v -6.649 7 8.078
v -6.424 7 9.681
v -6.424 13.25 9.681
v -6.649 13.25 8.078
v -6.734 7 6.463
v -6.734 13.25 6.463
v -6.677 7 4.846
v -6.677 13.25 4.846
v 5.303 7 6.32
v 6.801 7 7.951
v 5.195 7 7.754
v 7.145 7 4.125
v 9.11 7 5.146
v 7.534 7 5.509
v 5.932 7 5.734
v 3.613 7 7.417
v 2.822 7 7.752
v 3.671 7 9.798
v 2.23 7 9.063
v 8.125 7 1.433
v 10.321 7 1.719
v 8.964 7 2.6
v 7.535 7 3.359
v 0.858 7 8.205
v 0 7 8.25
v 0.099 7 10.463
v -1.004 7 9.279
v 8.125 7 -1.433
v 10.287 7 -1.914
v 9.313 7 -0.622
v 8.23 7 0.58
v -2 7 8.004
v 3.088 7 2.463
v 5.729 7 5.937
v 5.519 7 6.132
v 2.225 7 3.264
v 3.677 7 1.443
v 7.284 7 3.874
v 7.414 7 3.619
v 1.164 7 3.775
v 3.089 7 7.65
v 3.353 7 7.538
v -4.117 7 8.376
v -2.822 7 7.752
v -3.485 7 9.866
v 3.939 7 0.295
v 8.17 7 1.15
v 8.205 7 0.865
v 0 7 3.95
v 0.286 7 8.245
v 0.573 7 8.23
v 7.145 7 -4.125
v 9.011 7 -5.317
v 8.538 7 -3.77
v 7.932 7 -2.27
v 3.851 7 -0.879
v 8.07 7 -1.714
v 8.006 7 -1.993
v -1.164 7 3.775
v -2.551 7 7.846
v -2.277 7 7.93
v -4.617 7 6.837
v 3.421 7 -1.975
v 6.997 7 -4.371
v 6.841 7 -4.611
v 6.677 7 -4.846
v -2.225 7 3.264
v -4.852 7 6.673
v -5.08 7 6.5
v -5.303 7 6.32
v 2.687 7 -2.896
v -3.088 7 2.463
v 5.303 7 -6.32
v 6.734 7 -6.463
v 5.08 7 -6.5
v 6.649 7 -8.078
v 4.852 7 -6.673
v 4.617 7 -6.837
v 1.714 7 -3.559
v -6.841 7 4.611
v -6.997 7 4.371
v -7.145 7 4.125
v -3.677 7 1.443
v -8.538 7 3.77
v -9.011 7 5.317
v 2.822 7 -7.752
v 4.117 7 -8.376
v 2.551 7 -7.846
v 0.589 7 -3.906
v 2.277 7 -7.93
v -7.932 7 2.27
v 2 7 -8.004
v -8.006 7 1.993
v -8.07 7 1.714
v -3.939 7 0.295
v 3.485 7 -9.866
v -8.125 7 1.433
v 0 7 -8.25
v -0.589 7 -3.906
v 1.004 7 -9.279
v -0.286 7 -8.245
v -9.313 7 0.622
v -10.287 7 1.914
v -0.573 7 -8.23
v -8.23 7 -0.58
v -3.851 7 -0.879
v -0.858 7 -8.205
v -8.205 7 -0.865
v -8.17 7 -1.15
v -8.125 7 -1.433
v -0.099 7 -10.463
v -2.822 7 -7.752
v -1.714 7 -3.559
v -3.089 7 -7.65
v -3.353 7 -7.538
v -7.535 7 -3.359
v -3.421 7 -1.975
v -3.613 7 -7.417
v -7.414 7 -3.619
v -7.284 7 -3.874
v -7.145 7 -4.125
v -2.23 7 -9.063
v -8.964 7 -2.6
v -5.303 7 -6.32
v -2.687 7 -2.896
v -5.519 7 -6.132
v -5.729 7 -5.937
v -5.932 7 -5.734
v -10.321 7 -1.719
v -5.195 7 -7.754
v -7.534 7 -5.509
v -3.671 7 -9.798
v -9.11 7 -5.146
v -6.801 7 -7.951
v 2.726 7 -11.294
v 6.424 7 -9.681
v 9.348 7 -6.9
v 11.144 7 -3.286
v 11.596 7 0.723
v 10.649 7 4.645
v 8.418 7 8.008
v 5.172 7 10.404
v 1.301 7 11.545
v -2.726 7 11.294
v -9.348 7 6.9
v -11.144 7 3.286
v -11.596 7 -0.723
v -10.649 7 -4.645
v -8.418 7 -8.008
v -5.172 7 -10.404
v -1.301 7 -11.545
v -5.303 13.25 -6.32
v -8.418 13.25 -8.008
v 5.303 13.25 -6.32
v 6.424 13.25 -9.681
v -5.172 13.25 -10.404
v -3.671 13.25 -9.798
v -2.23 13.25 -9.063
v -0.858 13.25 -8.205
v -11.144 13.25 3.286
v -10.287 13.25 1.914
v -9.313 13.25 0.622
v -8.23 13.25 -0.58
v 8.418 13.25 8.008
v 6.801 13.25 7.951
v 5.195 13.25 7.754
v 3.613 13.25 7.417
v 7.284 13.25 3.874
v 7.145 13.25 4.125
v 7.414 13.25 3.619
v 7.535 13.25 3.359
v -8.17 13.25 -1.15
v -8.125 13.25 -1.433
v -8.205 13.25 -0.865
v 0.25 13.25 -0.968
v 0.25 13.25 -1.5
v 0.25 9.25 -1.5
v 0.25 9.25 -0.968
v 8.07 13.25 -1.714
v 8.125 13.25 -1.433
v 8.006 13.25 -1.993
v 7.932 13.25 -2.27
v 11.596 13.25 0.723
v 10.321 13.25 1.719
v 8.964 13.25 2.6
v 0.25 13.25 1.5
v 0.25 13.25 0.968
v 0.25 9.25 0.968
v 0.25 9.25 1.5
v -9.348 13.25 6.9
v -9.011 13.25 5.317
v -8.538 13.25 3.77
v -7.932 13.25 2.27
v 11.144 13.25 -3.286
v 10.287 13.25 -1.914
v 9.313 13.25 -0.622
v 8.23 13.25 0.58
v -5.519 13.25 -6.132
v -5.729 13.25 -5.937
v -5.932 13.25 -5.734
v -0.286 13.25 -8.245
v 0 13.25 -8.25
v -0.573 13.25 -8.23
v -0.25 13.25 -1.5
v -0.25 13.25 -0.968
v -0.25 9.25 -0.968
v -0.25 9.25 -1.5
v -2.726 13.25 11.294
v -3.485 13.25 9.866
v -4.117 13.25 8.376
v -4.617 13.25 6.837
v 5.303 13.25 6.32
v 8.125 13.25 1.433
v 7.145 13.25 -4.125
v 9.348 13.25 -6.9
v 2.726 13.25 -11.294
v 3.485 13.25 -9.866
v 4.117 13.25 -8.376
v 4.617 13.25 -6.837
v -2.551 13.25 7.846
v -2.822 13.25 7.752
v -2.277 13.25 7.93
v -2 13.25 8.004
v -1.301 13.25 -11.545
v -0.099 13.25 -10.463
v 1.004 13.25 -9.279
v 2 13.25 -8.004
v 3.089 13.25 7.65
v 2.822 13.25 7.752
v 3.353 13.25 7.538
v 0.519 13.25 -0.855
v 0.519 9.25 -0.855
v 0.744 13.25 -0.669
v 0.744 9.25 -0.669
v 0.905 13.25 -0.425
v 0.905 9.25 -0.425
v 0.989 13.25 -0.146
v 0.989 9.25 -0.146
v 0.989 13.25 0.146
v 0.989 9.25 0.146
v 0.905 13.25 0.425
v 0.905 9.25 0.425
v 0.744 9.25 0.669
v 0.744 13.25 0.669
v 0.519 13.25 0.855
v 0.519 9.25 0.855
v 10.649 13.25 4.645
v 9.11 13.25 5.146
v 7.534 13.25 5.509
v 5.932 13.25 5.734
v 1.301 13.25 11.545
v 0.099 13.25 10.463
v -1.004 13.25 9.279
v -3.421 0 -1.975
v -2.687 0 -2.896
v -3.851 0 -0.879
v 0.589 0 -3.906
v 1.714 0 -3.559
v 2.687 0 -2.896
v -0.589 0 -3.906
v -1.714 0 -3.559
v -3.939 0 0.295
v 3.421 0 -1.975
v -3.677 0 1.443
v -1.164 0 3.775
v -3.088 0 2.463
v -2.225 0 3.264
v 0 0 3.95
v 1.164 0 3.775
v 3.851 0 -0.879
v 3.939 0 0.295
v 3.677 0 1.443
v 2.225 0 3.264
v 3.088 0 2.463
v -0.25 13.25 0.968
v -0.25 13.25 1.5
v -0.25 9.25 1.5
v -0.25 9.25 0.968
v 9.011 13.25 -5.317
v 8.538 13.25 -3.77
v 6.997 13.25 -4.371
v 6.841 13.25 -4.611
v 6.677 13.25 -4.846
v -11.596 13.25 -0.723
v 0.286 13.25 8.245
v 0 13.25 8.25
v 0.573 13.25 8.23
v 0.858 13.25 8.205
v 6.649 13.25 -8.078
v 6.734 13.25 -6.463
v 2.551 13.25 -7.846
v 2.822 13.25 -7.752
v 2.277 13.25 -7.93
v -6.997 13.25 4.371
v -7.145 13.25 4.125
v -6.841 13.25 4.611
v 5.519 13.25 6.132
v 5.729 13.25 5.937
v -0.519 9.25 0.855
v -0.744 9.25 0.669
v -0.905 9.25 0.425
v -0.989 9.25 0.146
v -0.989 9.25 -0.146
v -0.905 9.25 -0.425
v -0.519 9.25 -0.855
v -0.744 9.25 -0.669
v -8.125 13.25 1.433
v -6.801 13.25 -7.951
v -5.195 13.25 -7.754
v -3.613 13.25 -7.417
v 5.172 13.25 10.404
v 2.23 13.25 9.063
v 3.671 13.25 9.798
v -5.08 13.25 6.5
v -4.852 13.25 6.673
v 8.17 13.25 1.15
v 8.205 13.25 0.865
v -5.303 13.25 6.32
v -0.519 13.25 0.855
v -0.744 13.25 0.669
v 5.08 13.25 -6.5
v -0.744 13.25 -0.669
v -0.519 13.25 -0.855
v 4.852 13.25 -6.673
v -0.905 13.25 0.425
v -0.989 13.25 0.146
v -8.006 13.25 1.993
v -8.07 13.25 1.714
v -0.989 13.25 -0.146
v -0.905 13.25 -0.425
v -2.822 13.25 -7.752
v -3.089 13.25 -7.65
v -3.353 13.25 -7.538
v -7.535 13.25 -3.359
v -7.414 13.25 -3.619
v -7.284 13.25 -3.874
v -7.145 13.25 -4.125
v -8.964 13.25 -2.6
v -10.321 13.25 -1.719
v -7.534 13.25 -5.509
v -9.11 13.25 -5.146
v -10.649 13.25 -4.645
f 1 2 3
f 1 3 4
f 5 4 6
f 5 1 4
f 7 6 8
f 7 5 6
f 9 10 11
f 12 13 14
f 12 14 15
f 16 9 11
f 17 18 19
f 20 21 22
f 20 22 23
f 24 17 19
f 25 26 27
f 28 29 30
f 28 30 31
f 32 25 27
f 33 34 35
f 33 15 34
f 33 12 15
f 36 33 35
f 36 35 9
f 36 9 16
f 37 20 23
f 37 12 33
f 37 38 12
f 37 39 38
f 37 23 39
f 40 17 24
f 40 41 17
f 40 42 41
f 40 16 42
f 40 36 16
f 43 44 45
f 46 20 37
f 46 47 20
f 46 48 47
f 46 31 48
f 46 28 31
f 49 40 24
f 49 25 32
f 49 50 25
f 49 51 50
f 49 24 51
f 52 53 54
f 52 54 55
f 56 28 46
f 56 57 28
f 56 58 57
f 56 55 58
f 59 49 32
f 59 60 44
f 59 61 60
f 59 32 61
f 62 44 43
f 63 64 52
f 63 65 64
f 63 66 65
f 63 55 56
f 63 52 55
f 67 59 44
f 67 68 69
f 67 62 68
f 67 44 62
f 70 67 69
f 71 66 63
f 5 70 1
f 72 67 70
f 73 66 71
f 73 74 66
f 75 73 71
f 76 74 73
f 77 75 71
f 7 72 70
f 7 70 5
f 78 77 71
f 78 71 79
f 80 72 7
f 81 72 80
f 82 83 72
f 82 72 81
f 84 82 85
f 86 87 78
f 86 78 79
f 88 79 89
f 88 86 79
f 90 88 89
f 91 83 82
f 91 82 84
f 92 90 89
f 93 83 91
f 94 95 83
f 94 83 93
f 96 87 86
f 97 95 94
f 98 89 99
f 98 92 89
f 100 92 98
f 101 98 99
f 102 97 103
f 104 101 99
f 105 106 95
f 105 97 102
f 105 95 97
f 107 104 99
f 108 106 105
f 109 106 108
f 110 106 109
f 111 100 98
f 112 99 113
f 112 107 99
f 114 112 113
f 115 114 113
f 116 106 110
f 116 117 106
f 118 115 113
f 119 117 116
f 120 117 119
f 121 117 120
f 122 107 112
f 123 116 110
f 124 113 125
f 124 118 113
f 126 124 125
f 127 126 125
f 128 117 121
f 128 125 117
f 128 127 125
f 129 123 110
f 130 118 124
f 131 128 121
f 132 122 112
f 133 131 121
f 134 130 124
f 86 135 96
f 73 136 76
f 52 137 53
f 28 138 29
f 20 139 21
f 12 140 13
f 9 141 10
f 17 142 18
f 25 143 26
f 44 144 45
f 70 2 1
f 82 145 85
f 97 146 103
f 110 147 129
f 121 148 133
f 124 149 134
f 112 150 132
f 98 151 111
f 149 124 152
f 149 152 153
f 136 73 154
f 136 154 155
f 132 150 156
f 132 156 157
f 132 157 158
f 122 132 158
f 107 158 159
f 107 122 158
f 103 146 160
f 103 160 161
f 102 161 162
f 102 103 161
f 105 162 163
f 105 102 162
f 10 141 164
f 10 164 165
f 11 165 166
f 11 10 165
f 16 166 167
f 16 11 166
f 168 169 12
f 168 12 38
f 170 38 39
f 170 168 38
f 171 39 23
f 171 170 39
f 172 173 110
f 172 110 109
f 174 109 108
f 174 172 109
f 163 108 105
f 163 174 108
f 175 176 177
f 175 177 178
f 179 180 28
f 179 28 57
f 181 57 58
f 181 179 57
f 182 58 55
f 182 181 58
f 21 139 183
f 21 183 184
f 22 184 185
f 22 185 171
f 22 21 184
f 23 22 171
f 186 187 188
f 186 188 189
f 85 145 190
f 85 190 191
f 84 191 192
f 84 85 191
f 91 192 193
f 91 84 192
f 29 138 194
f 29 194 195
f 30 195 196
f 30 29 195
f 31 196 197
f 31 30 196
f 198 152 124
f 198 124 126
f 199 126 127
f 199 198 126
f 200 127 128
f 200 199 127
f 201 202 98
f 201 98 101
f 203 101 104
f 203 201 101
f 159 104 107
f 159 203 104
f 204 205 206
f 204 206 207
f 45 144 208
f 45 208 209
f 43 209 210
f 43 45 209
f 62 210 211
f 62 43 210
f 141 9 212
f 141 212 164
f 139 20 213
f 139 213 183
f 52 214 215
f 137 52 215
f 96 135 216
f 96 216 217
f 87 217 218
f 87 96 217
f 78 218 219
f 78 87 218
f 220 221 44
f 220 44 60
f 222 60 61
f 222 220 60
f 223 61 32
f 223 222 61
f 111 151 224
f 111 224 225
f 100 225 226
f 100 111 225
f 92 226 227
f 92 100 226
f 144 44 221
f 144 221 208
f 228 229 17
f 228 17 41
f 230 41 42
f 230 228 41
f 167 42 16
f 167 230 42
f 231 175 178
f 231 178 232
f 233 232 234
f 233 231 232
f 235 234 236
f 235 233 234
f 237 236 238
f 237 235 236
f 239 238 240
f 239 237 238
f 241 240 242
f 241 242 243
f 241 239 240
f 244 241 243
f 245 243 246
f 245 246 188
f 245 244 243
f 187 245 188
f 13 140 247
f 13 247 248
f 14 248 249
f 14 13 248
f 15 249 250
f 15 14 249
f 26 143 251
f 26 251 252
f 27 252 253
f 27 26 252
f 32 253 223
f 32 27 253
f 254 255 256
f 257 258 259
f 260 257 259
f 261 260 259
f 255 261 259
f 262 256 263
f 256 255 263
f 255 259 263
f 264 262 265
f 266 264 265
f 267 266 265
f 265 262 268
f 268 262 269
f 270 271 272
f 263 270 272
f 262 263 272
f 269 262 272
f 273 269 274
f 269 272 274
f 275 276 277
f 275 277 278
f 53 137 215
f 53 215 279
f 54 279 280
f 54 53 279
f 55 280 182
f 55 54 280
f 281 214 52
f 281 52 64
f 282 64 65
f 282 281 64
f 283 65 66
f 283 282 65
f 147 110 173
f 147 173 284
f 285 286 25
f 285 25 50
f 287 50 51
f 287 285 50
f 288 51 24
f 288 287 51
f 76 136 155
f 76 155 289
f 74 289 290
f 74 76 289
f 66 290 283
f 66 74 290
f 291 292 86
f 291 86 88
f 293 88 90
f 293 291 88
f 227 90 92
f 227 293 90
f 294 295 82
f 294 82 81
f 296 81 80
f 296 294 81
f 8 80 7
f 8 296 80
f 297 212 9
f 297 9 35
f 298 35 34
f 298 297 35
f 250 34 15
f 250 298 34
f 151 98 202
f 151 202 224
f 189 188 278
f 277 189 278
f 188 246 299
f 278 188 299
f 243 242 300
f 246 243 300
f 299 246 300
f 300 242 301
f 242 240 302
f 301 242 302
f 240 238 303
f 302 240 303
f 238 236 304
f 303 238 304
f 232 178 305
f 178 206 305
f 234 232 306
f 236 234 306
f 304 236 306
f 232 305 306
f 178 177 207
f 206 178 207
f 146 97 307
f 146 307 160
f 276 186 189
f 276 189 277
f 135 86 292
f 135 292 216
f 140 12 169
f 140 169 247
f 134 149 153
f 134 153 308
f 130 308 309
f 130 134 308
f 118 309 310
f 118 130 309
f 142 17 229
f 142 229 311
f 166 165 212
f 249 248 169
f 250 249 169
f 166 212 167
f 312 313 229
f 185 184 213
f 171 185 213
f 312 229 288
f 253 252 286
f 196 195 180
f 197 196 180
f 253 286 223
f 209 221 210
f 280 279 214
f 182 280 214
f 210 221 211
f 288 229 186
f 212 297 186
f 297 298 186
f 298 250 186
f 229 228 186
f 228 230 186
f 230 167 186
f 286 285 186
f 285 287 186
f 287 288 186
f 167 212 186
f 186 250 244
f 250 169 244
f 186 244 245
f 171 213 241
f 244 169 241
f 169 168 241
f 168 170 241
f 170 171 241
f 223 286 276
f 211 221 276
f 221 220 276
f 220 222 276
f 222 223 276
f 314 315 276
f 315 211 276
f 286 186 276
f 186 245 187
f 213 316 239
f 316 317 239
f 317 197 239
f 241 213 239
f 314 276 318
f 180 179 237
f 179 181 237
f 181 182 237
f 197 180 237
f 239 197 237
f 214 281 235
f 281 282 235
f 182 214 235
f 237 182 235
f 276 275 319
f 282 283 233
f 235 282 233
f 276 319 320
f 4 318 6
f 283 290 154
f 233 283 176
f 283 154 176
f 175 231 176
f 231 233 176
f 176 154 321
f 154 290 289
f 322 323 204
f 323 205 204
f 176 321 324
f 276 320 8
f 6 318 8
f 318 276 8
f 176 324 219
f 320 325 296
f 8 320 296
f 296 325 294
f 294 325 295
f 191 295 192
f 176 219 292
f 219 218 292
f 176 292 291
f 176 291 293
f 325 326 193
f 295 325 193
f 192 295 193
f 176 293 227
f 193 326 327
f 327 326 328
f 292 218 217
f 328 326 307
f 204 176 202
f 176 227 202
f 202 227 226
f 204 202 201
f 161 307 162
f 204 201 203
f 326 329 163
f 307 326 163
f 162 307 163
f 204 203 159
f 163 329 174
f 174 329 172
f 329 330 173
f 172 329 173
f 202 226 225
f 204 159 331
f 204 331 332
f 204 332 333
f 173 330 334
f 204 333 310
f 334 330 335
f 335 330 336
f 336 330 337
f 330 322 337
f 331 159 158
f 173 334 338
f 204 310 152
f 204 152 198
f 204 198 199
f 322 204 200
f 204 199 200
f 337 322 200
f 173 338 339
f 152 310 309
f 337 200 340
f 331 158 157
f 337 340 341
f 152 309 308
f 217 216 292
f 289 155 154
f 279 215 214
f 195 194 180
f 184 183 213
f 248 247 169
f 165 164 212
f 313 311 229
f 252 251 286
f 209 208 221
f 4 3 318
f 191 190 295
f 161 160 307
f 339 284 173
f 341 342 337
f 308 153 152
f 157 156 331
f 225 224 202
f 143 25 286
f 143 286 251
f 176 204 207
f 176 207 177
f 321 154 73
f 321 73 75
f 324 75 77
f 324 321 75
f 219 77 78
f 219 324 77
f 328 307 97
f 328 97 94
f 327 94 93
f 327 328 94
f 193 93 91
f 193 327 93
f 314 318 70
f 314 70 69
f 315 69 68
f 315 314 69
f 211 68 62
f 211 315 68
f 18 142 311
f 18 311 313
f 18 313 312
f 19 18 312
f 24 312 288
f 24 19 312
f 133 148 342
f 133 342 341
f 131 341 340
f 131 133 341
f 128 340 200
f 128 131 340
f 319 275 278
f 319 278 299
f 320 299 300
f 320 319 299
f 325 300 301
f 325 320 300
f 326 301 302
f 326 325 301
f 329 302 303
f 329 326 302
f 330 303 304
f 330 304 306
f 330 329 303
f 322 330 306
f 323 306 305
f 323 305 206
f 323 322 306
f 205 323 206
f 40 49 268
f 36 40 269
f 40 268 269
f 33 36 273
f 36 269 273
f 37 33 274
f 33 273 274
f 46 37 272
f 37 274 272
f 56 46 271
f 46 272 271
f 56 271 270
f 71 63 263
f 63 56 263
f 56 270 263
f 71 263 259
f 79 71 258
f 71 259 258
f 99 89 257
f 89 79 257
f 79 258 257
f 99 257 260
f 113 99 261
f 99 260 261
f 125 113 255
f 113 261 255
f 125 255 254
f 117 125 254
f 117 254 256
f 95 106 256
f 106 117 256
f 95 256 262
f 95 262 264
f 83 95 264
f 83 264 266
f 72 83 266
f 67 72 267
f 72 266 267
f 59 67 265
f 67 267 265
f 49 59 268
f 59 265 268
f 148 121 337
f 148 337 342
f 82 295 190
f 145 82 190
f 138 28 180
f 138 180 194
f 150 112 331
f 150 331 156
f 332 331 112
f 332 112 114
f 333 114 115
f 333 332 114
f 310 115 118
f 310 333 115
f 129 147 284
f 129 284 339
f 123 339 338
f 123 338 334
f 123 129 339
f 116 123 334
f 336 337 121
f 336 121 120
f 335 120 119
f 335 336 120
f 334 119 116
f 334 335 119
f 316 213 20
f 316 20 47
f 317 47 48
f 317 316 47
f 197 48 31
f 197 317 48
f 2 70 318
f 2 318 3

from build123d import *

# Parameters (mm, degrees)
SKETCH2_R           = 3.95
BOSS_EXTRUDE1_DEPTH = 13.25
SKETCH3_R           = 8.25
BOSS_EXTRUDE2_DEPTH = 6.25
CUT_EXTRUDE1_DEPTH  = 4
BOSS_EXTRUDE3_DEPTH = 6.25


with BuildPart() as part:
    # Sketch2 → Boss-Extrude1 (new body)
    with BuildSketch(Plane(origin=(0, 0, 0), x_dir=(1, 0, 0), z_dir=(0, 1, 0))):
        with Locations(Location((0, 0, 0), (0, 0, 270))):
            Circle(SKETCH2_R)
    extrude(amount=BOSS_EXTRUDE1_DEPTH)

    # Sketch3 → Boss-Extrude2 (add)
    with BuildSketch(Plane(origin=(0, 13.25, 0), x_dir=(1, 0, 0), z_dir=(0, 1, 0))):
        with Locations(Location((0, 0, 0), (0, 0, 270))):
            Circle(SKETCH3_R)
    extrude(amount=-BOSS_EXTRUDE2_DEPTH)

    # Sketch5 → Cut-Extrude1 (cut)
    with BuildSketch(Plane(origin=(0, 13.25, 0), x_dir=(1, 0, 0), z_dir=(0, 1, 0))):
        with BuildLine():
            Line((0.25, -0.968245837), (0.25, -1.5))
            Line((0.25, -1.5), (-0.25, -1.5))
            Line((-0.25, -1.5), (-0.25, -0.968245837))
            ThreePointArc((-0.25, -0.968245837), (-1, 0), (-0.25, 0.968245837))
            Line((-0.25, 0.968245837), (-0.25, 1.5))
            Line((-0.25, 1.5), (0.25, 1.5))
            Line((0.25, 1.5), (0.25, 0.968245837))
            ThreePointArc((0.25, 0.968245837), (1, 0), (0.25, -0.968245837))
        make_face()
    extrude(amount=-CUT_EXTRUDE1_DEPTH, mode=Mode.SUBTRACT)

    # Sketch4 → Boss-Extrude3 (add)
    with BuildSketch(Plane(origin=(0, 7, 0), x_dir=(1, 0, 0), z_dir=(0, 1, 0))):
        with BuildLine():
            Line((0, 8.25), (-1.301452207, 11.545140545))
            ThreePointArc((-1.301452207, 11.545140545), (0.465666366, 9.883034259), (2, 8.003905297))
            Line((2, 8.003905297), (0, 8.25))
        make_face()
        with BuildLine():
            Line((2.821666182, 7.752464121), (2.725705589, 11.294006247))
            ThreePointArc((2.725705589, 11.294006247), (3.817780042, 9.127747087), (4.616882078, 6.837170458))
            Line((4.616882078, 6.837170458), (2.821666182, 7.752464121))
        make_face()
        with BuildLine():
            Line((5.30299778, 6.319866656), (6.424103064, 9.680648113))
            ThreePointArc((6.424103064, 9.680648113), (6.7094131, 7.271518905), (6.67690004, 4.845771956))
            Line((6.67690004, 4.845771956), (5.30299778, 6.319866656))
        make_face()
        with BuildLine():
            Line((7.144709581, 4.125), (9.347658899, 6.899660946))
            ThreePointArc((9.347658899, 6.899660946), (8.791791918, 4.538238227), (7.931585317, 2.269901841))
            Line((7.931585317, 2.269901841), (7.144709581, 4.125))
        make_face()
        with BuildLine():
            Line((8.124663962, 1.432597466), (11.143749115, 3.28647284))
            ThreePointArc((11.143749115, 3.28647284), (9.813750878, 1.257579041), (8.229604346, -0.579751937))
            Line((8.229604346, -0.579751937), (8.124663962, 1.432597466))
        make_face()
        with BuildLine():
            Line((8.124663962, -1.432597466), (11.595738723, -0.723112393))
            ThreePointArc((11.595738723, -0.723112393), (9.652026646, -2.174762737), (7.535011635, -3.359479075))
            Line((7.535011635, -3.359479075), (8.124663962, -1.432597466))
        make_face()
        with BuildLine():
            Line((7.144709581, -4.125), (10.649111106, -4.6454796))
            ThreePointArc((10.649111106, -4.6454796), (8.326125552, -5.344796032), (5.931585317, -5.734003456))
            Line((5.931585317, -5.734003456), (7.144709581, -4.125))
        make_face()
        with BuildLine():
            Line((5.30299778, -6.319866656), (8.418043526, -8.007533407))
            ThreePointArc((8.418043526, -8.007533407), (5.995970836, -7.870168046), (3.612722268, -7.416922395))
            Line((3.612722268, -7.416922395), (5.30299778, -6.319866656))
        make_face()
        with BuildLine():
            Line((2.821666182, -7.752464121), (5.171635659, -10.403760506))
            ThreePointArc((5.171635659, -10.403760506), (2.942613546, -9.446281642), (0.858111595, -8.205251032))
            Line((0.858111595, -8.205251032), (2.821666182, -7.752464121))
        make_face()
        with BuildLine():
            Line((0, -8.25), (1.301452207, -11.545140545))
            ThreePointArc((1.301452207, -11.545140545), (-0.465666366, -9.883034259), (-2, -8.003905297))
            Line((-2, -8.003905297), (0, -8.25))
        make_face()
        with BuildLine():
            Line((-2.821666182, -7.752464121), (-2.725705589, -11.294006247))
            ThreePointArc((-2.725705589, -11.294006247), (-3.817780042, -9.127747087), (-4.616882078, -6.837170458))
            Line((-4.616882078, -6.837170458), (-2.821666182, -7.752464121))
        make_face()
        with BuildLine():
            Line((-5.30299778, -6.319866656), (-6.424103064, -9.680648113))
            ThreePointArc((-6.424103064, -9.680648113), (-6.7094131, -7.271518905), (-6.67690004, -4.845771956))
            Line((-6.67690004, -4.845771956), (-5.30299778, -6.319866656))
        make_face()
        with BuildLine():
            Line((-7.144709581, -4.125), (-9.347658899, -6.899660946))
            ThreePointArc((-9.347658899, -6.899660946), (-8.791791918, -4.538238227), (-7.931585317, -2.269901841))
            Line((-7.931585317, -2.269901841), (-7.144709581, -4.125))
        make_face()
        with BuildLine():
            Line((-8.124663962, -1.432597466), (-11.143749115, -3.28647284))
            ThreePointArc((-11.143749115, -3.28647284), (-9.813750878, -1.257579041), (-8.229604346, 0.579751937))
            Line((-8.229604346, 0.579751937), (-8.124663962, -1.432597466))
        make_face()
        with BuildLine():
            Line((-8.124663962, 1.432597466), (-11.595738723, 0.723112393))
            ThreePointArc((-11.595738723, 0.723112393), (-9.652026646, 2.174762737), (-7.535011635, 3.359479075))
            Line((-7.535011635, 3.359479075), (-8.124663962, 1.432597466))
        make_face()
        with BuildLine():
            Line((-7.144709581, 4.125), (-10.649111106, 4.6454796))
            ThreePointArc((-10.649111106, 4.6454796), (-8.326125552, 5.344796032), (-5.931585317, 5.734003456))
            Line((-5.931585317, 5.734003456), (-7.144709581, 4.125))
        make_face()
        with BuildLine():
            Line((-5.30299778, 6.319866656), (-8.418043526, 8.007533407))
            ThreePointArc((-8.418043526, 8.007533407), (-5.995970836, 7.870168046), (-3.612722268, 7.416922395))
            Line((-3.612722268, 7.416922395), (-5.30299778, 6.319866656))
        make_face()
        with BuildLine():
            Line((-2.821666182, 7.752464121), (-5.171635659, 10.403760506))
            ThreePointArc((-5.171635659, 10.403760506), (-2.942613546, 9.446281642), (-0.858111595, 8.205251032))
            Line((-0.858111595, 8.205251032), (-2.821666182, 7.752464121))
        make_face()
    extrude(amount=BOSS_EXTRUDE3_DEPTH)


solid = part.part
